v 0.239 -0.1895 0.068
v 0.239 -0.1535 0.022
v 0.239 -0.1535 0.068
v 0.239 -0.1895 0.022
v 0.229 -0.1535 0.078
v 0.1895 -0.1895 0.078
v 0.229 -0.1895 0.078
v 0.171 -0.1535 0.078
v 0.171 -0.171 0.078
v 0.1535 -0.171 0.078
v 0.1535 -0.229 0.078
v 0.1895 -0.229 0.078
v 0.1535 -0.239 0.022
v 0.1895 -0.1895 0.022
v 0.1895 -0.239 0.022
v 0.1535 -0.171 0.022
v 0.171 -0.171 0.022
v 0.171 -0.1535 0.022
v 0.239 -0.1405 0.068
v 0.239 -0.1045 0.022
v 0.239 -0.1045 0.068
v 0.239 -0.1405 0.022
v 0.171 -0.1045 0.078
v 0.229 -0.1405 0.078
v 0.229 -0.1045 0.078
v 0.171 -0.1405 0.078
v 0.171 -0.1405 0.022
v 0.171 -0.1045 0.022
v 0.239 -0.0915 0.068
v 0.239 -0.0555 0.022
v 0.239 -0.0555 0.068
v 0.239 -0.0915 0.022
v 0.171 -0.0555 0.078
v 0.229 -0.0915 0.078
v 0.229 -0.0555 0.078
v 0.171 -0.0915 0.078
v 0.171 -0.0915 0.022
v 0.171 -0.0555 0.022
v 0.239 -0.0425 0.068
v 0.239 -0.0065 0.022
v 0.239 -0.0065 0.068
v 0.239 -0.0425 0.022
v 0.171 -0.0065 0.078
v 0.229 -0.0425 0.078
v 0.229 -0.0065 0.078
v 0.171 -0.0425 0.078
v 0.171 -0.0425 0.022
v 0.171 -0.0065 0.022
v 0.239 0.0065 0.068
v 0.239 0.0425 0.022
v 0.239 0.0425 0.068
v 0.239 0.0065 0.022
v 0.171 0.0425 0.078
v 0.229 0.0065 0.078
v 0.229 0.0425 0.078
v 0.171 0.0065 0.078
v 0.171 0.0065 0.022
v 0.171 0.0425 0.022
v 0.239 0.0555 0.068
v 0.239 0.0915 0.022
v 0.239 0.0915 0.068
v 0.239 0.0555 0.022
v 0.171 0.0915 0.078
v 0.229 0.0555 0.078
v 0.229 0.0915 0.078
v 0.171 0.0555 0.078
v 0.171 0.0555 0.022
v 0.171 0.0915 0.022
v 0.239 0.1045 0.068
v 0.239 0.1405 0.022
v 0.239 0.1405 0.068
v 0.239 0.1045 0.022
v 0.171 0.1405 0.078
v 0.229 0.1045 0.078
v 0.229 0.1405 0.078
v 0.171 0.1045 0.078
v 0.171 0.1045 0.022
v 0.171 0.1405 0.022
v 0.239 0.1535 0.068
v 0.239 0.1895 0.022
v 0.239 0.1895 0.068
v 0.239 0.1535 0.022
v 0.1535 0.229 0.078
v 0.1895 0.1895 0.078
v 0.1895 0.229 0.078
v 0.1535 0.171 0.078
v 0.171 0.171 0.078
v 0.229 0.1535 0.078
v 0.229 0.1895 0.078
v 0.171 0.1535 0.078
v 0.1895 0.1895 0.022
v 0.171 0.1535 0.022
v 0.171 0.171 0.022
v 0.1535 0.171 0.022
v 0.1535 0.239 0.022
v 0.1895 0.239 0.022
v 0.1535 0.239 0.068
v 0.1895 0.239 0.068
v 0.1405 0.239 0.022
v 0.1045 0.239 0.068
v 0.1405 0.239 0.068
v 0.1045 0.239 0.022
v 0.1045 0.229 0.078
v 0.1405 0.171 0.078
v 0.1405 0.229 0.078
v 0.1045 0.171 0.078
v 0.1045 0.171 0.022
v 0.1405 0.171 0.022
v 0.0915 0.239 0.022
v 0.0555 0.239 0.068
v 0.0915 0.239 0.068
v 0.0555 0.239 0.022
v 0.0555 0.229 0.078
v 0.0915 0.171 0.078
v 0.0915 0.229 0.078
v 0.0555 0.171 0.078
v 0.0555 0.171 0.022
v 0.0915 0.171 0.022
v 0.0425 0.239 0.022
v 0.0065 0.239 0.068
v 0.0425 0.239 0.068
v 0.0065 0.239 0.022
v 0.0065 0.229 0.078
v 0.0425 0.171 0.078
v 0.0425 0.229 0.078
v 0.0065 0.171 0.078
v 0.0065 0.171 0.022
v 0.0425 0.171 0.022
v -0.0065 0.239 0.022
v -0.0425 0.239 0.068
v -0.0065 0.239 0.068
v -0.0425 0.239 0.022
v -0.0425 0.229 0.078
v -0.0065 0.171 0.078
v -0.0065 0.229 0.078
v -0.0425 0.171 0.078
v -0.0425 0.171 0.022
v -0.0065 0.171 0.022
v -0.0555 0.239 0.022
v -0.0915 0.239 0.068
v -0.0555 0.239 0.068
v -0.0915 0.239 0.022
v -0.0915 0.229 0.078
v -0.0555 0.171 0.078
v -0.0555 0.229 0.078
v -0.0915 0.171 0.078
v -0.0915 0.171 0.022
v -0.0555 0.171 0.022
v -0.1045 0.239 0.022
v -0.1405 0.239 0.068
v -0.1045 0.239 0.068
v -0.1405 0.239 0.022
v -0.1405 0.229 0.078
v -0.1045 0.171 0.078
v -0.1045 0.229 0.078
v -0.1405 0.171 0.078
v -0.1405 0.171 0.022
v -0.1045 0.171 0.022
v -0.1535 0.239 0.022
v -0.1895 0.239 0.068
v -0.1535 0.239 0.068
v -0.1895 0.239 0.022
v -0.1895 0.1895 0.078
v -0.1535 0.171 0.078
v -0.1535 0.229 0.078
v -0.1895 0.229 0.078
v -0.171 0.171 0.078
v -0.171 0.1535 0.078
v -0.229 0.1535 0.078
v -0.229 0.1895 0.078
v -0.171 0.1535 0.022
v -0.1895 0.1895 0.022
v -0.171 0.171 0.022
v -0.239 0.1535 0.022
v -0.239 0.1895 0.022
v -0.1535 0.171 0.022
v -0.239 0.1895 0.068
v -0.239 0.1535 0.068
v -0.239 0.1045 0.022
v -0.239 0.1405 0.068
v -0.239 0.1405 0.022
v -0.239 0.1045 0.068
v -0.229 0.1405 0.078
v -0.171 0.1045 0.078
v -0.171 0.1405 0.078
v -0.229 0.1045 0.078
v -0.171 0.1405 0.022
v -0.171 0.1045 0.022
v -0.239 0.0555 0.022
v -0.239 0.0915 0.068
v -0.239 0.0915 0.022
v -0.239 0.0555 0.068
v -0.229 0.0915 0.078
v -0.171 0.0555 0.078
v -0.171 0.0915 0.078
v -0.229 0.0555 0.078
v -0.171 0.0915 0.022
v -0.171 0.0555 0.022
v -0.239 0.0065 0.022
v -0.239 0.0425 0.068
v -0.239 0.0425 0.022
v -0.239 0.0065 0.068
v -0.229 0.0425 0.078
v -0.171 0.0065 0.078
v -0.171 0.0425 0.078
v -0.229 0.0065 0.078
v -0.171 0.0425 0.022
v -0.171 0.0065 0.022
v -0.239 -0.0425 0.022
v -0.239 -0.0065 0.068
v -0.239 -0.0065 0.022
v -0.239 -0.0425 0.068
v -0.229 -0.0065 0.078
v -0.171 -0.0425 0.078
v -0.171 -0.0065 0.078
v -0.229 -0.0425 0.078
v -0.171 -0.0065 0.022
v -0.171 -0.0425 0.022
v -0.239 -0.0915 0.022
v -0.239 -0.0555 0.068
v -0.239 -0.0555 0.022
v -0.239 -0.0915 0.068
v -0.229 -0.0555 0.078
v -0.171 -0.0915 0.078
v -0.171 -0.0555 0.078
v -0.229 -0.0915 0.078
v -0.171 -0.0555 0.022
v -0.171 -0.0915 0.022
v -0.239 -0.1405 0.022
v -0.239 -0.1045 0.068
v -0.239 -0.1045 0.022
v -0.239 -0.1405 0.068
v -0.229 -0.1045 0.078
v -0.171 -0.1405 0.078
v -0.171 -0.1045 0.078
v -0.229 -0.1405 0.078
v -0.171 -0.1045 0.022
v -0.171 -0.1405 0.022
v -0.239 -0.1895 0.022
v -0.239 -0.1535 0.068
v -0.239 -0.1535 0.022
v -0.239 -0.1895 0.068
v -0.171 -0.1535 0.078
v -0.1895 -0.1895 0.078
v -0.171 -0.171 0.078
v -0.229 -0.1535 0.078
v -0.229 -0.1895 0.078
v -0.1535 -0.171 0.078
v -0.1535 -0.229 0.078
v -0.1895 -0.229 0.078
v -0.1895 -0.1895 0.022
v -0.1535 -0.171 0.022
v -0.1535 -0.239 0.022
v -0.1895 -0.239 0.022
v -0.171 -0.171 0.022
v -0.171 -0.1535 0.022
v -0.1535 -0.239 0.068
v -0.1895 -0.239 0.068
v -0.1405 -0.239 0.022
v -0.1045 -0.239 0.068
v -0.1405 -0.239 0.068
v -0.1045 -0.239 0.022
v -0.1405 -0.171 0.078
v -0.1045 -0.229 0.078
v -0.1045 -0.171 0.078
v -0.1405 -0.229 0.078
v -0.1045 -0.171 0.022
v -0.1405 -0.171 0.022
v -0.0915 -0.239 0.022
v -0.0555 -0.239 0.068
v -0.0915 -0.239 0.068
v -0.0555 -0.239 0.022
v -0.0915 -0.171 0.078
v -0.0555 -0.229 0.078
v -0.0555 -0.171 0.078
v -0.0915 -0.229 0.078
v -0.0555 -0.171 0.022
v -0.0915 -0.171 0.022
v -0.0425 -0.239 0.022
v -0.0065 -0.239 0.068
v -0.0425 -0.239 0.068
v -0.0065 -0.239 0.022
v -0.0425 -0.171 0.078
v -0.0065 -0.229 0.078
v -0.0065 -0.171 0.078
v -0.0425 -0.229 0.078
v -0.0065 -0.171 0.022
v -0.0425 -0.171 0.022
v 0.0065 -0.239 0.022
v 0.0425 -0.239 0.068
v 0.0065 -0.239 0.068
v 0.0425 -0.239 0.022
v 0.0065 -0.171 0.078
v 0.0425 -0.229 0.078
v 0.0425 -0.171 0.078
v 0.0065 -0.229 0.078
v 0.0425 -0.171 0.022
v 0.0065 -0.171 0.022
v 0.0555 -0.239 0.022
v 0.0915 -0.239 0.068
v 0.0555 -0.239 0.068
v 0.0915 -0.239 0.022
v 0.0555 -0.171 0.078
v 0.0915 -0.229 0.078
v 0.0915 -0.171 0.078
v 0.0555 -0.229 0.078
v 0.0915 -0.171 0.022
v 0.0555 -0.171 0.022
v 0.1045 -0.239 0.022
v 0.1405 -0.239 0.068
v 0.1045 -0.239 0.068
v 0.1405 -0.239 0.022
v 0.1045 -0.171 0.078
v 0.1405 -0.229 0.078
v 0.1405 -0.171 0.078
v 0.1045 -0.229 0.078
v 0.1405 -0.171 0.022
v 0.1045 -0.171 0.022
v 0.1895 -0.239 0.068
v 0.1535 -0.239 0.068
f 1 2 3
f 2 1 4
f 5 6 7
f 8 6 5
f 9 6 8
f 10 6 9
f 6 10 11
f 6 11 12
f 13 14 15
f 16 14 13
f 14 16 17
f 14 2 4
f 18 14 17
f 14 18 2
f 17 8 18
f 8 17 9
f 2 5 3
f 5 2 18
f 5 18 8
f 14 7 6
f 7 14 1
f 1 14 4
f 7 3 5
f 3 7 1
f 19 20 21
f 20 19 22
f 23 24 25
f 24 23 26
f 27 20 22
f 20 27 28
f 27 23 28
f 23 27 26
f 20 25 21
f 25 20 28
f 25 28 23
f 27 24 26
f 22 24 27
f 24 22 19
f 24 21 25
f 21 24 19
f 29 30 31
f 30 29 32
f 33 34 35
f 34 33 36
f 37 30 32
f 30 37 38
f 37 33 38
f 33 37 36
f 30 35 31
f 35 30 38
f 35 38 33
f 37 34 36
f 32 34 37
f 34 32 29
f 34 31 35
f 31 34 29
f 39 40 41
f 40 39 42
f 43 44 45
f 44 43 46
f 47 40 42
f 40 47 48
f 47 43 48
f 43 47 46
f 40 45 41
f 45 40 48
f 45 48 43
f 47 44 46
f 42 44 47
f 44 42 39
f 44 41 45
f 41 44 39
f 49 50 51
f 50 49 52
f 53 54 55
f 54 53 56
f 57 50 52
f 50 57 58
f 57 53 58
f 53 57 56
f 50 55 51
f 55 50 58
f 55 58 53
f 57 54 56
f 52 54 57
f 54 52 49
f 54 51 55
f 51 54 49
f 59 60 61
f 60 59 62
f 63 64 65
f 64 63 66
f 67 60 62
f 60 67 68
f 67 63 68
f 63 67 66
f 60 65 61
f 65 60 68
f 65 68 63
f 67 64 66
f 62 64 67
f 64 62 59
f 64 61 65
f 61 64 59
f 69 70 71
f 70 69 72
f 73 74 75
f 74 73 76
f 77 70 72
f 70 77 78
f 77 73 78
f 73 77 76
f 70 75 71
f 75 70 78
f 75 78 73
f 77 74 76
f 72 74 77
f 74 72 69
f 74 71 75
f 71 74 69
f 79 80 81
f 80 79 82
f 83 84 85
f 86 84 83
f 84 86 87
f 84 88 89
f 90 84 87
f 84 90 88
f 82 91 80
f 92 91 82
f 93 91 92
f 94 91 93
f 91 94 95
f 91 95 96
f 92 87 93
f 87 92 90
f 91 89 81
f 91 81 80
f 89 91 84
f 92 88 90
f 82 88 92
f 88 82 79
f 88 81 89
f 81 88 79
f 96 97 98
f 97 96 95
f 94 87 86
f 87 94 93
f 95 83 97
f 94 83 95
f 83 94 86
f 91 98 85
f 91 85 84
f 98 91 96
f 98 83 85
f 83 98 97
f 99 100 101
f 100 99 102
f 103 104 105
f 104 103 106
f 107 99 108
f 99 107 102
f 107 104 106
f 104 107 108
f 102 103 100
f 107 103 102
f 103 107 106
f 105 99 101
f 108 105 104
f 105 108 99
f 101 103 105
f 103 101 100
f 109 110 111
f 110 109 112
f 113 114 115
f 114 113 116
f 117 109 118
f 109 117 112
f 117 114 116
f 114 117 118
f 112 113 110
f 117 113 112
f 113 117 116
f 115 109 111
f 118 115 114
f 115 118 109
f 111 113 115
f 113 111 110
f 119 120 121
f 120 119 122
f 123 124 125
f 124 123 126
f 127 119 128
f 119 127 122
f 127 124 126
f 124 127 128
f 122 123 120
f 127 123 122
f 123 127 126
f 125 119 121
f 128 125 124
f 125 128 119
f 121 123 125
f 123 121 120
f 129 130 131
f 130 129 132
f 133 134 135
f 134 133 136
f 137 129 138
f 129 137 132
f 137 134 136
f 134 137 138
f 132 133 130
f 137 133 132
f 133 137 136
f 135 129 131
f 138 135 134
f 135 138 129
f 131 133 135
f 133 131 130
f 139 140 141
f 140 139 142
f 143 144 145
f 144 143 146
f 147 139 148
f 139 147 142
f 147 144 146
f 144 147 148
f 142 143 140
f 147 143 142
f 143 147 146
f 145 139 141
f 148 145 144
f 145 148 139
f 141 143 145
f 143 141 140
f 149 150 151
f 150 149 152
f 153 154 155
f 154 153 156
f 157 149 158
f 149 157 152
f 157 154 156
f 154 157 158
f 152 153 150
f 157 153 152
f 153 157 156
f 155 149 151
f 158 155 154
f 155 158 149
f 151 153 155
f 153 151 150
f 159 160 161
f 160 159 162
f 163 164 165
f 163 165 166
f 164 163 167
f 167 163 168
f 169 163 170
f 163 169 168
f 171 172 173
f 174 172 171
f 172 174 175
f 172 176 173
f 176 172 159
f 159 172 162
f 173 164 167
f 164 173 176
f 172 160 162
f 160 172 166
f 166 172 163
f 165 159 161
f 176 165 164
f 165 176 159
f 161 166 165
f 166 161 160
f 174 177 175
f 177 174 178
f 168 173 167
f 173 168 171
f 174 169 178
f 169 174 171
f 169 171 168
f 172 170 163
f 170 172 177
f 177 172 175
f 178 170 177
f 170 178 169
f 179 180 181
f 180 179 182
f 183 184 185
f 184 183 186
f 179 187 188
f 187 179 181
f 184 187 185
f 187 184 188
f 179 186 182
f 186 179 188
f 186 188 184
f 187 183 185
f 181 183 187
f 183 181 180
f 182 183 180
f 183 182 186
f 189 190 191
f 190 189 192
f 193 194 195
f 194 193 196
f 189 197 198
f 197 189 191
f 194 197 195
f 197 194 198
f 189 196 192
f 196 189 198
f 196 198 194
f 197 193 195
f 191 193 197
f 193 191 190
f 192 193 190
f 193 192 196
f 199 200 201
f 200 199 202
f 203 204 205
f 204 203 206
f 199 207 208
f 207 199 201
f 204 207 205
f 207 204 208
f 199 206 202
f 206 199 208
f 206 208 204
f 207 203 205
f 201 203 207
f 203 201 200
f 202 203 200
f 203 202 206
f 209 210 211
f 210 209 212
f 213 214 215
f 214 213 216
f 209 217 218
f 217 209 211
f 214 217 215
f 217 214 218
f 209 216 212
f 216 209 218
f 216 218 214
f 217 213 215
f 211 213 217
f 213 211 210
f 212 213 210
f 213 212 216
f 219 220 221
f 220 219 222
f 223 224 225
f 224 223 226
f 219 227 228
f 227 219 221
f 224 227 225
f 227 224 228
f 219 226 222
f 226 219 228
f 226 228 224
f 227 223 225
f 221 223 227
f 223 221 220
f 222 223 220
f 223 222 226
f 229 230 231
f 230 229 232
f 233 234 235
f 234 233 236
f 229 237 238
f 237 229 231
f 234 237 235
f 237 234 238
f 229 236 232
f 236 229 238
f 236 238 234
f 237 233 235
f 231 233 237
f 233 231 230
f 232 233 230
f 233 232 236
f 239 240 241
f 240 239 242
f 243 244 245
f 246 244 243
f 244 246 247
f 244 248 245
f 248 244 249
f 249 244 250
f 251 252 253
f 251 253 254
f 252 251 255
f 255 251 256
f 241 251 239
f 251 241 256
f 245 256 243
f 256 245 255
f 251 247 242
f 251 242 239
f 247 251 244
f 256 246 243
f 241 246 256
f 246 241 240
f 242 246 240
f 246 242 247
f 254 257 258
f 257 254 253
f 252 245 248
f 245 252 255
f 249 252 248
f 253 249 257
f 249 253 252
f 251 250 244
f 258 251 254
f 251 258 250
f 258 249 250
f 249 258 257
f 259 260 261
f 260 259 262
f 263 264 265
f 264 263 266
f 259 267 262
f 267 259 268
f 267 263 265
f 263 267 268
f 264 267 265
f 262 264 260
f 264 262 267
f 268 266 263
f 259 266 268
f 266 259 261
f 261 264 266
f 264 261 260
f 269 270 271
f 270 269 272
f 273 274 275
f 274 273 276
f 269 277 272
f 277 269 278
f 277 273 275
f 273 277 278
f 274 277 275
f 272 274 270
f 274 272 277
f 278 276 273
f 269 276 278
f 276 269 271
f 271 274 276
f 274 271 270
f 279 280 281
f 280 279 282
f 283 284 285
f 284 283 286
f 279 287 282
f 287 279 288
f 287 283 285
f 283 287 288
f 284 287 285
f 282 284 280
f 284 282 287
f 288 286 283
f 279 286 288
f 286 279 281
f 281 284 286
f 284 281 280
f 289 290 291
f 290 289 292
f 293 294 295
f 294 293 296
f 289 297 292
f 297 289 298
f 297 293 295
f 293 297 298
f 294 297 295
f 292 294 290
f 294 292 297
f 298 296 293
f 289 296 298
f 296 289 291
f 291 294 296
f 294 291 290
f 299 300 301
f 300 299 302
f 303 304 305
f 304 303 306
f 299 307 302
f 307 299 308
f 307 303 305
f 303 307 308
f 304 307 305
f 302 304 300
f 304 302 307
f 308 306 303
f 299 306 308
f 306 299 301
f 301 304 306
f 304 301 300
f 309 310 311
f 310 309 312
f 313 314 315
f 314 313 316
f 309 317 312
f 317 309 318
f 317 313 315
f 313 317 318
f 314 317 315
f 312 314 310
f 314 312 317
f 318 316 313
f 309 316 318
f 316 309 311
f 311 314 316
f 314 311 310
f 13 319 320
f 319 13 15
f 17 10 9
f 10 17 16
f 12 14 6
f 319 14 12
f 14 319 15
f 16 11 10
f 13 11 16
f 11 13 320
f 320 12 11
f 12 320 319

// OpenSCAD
// file: DataSymbol.scad
boxSize = 0.029;
lineSize = 0.0045;
symDepth = 0.01;
vertSeparation = 0.019;
horizSeparation = 0.018;

module DataSymbol() {
  boxVertCenter = (boxSize+vertSeparation)/2;
  boxHorizCenter = (boxSize+horizSeparation)/2;
  linear_extrude(symDepth, center=true) {
    translate([0,boxVertCenter]) square(boxSize, center=true); // top box
    translate([-boxHorizCenter,-boxVertCenter]) square(boxSize, center=true); // bottom left box
    translate([boxHorizCenter,-boxVertCenter]) square(boxSize, center=true); // bottom right box
    square([2*boxHorizCenter + lineSize, lineSize], center=true); // middle line
    translate([0, horizSeparation/4]) square([lineSize, horizSeparation/2 + lineSize], center=true); // line to top
    translate([-boxHorizCenter, -horizSeparation/4]) square([lineSize, horizSeparation/2 + lineSize], center=true); // line to bottom left
    translate([boxHorizCenter, -horizSeparation/4]) square([lineSize, horizSeparation/2 + lineSize], center=true); // line to bottom right
  }
}

DataSymbol();
// file: PowerSymbol.scad
symWidth = 0.038;
symHeight = 0.086;
symDepth = 0.01;
middleHeight = 0.0075;
topHorizOffset = 0.007;
sideVertOffset = 0.007;

module PowerSymbol() {
  linear_extrude(symDepth, center=true) {
    halfHei = symHeight/2;
    halfWid = symWidth/2;
    halfMid = middleHeight/2;
    polygon([
      [topHorizOffset, halfHei],
      [0, halfMid],
      [halfWid, sideVertOffset],
      [-topHorizOffset, -halfHei],
      [0, -halfMid],
      [-halfWid, -sideVertOffset]
    ]);
  }
}

PowerSymbol();
// file: BasicFPGAHousing_paintcap.scad
include <FPGA_shared.scad>;
use <BasicFPGAHousing_base.scad>;

module BasicFPGAHousing_paintcap() {
  bevelDepth = capBevel * sqrt(2);
  difference() {
    translate([0,0,baseTop]) {
      cube(size=[capSize, capSize, capDepth*2], center=true);
    }
    cube(size=[slotSize+eps, slotSize+eps, smallGridSize], center=true);
    for (edge=[1:4]) rotate([0,0,90*edge]) {
      translate([0,capSize/2,baseTop+capDepth]) rotate([45,0,0])
        cube(size=[capSize+0.1, bevelDepth, bevelDepth*2], center=true);
    }
  }
}

%BasicFPGAHousing_base();
BasicFPGAHousing_paintcap();
// file: BasicFPGAHousing_base.scad
include <FPGA_shared.scad>;
use <BasicFPGAHousing_paintcap.scad>;
use <PowerSymbol.scad>;
use <DataSymbol.scad>;

module BasiFPGAHousing_chipcutout() {
  slotPinBaseOffset = (-slotPinEdgeCount-1)/2 * slotPinEdgeSpacing;
  slotPinEdgeOffset = slotSize/2 - slotPinSize/2 - slotPinEdgePad;
  union() {
    translate([0, 0, baseDepth/2 + slotBottom + slotPinDepth]) {
      cube(size=[slotSize, slotSize, baseDepth], center=true);
    }
    for(edge=[1:4]) rotate([0,0,90*edge]) {
      for(i=[1:slotPinEdgeCount]) {
        translate([
          slotPinBaseOffset + slotPinEdgeSpacing*i,
          slotPinEdgeOffset,
          slotBottom + slotPinDepth
        ]) {
          cube(size=[slotPinSize, slotPinSize, slotPinDepth*2], center=true);
        }
      }
    }
    translate([alignHoleOffset,alignHoleOffset,slotBottom + slotPinDepth])
      cylinder(h=alignHoleDepth*2, r=alignHoleRadius, center=true, $fn=alignHoleSides);
  }
}

module BasicFPGAHousing_base() {
  middleSize = (slotSize + capSize) / 2;
  difference() {
    union() {
      translate([0,0,baseCenter])
        cube(size=[baseSize, baseSize, baseDepth], center=true);
      translate([0,0,baseTop-eps])
        cube(size=[middleSize, middleSize, capDepth*2], center=true);
    }
    translate([0,0,baseBottom])
      cube(size=[baseBackCutoutSize, baseBackCutoutSize, baseBackCutoutDepth*2], center=true);
    BasiFPGAHousing_chipcutout();
    cablecutout();
    rotate([0,0,180]) cablecutout();
  }
}

BasicFPGAHousing_base();
%BasicFPGAHousing_paintcap();
%translate([0.067,0.25,-0.001]) rotate([-90, 0, 0]) PowerSymbol();
%translate([0.073,-0.25,0.001]) rotate([90, 0, 0]) DataSymbol();
// file: FPGA_shared.scad
smallGridSize = 0.5;
baseSize = smallGridSize;
baseTop = 0.05;
baseBottom = -0.045;
baseDepth = baseTop - baseBottom;
baseCenter = (baseTop + baseBottom)/2;
baseBackRim = 0.02;
baseBackCutoutSize = baseSize - baseBackRim*2;
baseBackCutoutDepth = 0.01;
capSize = 0.41;
capDepth = 0.045;
capBevel = 0.01;
slotSize = smallGridSize * 0.5;
slotBottom = 0.03;
slotPinEdgeCount = 4;
slotPinEdgePad = 0.01;
slotPinEdgeSpacing = 0.045;
slotPinSize = 0.025;
slotPinDepth = 0.025;
eps = 0.00001;
chipTotalSize = slotSize - slotPinEdgePad*2 - slotPinSize/2;
chipTotalHeight = 0.1;
chipBaseHeight = 0.05;
pinHorizLength = 0.022;
pinHorizUnderLength = 0.008;
pinHorizWidth = 0.02;
pinHorizHeight = 0.015;
pinVertInnerOffset = 0.003;
pinVertOuterOffset = 0.003;
pinVertNarrowOffset = 0.003;
pinTotalHeight = chipTotalHeight - chipBaseHeight/2 + pinHorizHeight/2;
chipBaseSize = chipTotalSize - pinHorizLength*2;
chipBaseBevelSize = 0.005;
alignHoleRadius = 0.005;
alignHoleOffset = chipBaseSize/2 - 0.02;
alignHoleDepth = 0.005;
alignHoleSides = 8;
decoPinCount = 8;
decoPinWidth = 0.036;
decoPinLength = 0.034;
decoPinHeight = 0.028;
decoPinSpacing = 0.049;
decoPinBevelSize = 0.010;

module cablecutout() {
  cableradius = 0.025;
  cableDepth = 0.0125;
  translate([0,smallGridSize/2,0]) rotate([90,0,0]) {
    cylinder(h=cableDepth*2, r=cableradius, center=true, $fn=8);
  }
}
// main file
include <FPGA_shared.scad>;
use <BasicFPGAHousing_base.scad>;
use <BasicFPGAHousing_paintcap.scad>;

module BasicFPGAHousing_pins() {
  pinStartOffset = -(decoPinCount+1)/2 * decoPinSpacing;
  bevelSize = decoPinBevelSize * sqrt(2);

  for (edge=[0:3]) rotate([0,0,90*edge]) {
    for (pin=[1:decoPinCount]) translate([capSize/2, pinStartOffset+pin*decoPinSpacing, baseTop]) {
      difference() {
        cube(size=[decoPinLength*2, decoPinWidth, decoPinHeight*2], center=true);
        translate([decoPinLength,0,decoPinHeight]) rotate([0,45,0]) {
          cube(size=[bevelSize,decoPinWidth*2,bevelSize],center=true);
        }
      }
    }
  }
}

BasicFPGAHousing_pins();
%BasicFPGAHousing_base();
%BasicFPGAHousing_paintcap();
